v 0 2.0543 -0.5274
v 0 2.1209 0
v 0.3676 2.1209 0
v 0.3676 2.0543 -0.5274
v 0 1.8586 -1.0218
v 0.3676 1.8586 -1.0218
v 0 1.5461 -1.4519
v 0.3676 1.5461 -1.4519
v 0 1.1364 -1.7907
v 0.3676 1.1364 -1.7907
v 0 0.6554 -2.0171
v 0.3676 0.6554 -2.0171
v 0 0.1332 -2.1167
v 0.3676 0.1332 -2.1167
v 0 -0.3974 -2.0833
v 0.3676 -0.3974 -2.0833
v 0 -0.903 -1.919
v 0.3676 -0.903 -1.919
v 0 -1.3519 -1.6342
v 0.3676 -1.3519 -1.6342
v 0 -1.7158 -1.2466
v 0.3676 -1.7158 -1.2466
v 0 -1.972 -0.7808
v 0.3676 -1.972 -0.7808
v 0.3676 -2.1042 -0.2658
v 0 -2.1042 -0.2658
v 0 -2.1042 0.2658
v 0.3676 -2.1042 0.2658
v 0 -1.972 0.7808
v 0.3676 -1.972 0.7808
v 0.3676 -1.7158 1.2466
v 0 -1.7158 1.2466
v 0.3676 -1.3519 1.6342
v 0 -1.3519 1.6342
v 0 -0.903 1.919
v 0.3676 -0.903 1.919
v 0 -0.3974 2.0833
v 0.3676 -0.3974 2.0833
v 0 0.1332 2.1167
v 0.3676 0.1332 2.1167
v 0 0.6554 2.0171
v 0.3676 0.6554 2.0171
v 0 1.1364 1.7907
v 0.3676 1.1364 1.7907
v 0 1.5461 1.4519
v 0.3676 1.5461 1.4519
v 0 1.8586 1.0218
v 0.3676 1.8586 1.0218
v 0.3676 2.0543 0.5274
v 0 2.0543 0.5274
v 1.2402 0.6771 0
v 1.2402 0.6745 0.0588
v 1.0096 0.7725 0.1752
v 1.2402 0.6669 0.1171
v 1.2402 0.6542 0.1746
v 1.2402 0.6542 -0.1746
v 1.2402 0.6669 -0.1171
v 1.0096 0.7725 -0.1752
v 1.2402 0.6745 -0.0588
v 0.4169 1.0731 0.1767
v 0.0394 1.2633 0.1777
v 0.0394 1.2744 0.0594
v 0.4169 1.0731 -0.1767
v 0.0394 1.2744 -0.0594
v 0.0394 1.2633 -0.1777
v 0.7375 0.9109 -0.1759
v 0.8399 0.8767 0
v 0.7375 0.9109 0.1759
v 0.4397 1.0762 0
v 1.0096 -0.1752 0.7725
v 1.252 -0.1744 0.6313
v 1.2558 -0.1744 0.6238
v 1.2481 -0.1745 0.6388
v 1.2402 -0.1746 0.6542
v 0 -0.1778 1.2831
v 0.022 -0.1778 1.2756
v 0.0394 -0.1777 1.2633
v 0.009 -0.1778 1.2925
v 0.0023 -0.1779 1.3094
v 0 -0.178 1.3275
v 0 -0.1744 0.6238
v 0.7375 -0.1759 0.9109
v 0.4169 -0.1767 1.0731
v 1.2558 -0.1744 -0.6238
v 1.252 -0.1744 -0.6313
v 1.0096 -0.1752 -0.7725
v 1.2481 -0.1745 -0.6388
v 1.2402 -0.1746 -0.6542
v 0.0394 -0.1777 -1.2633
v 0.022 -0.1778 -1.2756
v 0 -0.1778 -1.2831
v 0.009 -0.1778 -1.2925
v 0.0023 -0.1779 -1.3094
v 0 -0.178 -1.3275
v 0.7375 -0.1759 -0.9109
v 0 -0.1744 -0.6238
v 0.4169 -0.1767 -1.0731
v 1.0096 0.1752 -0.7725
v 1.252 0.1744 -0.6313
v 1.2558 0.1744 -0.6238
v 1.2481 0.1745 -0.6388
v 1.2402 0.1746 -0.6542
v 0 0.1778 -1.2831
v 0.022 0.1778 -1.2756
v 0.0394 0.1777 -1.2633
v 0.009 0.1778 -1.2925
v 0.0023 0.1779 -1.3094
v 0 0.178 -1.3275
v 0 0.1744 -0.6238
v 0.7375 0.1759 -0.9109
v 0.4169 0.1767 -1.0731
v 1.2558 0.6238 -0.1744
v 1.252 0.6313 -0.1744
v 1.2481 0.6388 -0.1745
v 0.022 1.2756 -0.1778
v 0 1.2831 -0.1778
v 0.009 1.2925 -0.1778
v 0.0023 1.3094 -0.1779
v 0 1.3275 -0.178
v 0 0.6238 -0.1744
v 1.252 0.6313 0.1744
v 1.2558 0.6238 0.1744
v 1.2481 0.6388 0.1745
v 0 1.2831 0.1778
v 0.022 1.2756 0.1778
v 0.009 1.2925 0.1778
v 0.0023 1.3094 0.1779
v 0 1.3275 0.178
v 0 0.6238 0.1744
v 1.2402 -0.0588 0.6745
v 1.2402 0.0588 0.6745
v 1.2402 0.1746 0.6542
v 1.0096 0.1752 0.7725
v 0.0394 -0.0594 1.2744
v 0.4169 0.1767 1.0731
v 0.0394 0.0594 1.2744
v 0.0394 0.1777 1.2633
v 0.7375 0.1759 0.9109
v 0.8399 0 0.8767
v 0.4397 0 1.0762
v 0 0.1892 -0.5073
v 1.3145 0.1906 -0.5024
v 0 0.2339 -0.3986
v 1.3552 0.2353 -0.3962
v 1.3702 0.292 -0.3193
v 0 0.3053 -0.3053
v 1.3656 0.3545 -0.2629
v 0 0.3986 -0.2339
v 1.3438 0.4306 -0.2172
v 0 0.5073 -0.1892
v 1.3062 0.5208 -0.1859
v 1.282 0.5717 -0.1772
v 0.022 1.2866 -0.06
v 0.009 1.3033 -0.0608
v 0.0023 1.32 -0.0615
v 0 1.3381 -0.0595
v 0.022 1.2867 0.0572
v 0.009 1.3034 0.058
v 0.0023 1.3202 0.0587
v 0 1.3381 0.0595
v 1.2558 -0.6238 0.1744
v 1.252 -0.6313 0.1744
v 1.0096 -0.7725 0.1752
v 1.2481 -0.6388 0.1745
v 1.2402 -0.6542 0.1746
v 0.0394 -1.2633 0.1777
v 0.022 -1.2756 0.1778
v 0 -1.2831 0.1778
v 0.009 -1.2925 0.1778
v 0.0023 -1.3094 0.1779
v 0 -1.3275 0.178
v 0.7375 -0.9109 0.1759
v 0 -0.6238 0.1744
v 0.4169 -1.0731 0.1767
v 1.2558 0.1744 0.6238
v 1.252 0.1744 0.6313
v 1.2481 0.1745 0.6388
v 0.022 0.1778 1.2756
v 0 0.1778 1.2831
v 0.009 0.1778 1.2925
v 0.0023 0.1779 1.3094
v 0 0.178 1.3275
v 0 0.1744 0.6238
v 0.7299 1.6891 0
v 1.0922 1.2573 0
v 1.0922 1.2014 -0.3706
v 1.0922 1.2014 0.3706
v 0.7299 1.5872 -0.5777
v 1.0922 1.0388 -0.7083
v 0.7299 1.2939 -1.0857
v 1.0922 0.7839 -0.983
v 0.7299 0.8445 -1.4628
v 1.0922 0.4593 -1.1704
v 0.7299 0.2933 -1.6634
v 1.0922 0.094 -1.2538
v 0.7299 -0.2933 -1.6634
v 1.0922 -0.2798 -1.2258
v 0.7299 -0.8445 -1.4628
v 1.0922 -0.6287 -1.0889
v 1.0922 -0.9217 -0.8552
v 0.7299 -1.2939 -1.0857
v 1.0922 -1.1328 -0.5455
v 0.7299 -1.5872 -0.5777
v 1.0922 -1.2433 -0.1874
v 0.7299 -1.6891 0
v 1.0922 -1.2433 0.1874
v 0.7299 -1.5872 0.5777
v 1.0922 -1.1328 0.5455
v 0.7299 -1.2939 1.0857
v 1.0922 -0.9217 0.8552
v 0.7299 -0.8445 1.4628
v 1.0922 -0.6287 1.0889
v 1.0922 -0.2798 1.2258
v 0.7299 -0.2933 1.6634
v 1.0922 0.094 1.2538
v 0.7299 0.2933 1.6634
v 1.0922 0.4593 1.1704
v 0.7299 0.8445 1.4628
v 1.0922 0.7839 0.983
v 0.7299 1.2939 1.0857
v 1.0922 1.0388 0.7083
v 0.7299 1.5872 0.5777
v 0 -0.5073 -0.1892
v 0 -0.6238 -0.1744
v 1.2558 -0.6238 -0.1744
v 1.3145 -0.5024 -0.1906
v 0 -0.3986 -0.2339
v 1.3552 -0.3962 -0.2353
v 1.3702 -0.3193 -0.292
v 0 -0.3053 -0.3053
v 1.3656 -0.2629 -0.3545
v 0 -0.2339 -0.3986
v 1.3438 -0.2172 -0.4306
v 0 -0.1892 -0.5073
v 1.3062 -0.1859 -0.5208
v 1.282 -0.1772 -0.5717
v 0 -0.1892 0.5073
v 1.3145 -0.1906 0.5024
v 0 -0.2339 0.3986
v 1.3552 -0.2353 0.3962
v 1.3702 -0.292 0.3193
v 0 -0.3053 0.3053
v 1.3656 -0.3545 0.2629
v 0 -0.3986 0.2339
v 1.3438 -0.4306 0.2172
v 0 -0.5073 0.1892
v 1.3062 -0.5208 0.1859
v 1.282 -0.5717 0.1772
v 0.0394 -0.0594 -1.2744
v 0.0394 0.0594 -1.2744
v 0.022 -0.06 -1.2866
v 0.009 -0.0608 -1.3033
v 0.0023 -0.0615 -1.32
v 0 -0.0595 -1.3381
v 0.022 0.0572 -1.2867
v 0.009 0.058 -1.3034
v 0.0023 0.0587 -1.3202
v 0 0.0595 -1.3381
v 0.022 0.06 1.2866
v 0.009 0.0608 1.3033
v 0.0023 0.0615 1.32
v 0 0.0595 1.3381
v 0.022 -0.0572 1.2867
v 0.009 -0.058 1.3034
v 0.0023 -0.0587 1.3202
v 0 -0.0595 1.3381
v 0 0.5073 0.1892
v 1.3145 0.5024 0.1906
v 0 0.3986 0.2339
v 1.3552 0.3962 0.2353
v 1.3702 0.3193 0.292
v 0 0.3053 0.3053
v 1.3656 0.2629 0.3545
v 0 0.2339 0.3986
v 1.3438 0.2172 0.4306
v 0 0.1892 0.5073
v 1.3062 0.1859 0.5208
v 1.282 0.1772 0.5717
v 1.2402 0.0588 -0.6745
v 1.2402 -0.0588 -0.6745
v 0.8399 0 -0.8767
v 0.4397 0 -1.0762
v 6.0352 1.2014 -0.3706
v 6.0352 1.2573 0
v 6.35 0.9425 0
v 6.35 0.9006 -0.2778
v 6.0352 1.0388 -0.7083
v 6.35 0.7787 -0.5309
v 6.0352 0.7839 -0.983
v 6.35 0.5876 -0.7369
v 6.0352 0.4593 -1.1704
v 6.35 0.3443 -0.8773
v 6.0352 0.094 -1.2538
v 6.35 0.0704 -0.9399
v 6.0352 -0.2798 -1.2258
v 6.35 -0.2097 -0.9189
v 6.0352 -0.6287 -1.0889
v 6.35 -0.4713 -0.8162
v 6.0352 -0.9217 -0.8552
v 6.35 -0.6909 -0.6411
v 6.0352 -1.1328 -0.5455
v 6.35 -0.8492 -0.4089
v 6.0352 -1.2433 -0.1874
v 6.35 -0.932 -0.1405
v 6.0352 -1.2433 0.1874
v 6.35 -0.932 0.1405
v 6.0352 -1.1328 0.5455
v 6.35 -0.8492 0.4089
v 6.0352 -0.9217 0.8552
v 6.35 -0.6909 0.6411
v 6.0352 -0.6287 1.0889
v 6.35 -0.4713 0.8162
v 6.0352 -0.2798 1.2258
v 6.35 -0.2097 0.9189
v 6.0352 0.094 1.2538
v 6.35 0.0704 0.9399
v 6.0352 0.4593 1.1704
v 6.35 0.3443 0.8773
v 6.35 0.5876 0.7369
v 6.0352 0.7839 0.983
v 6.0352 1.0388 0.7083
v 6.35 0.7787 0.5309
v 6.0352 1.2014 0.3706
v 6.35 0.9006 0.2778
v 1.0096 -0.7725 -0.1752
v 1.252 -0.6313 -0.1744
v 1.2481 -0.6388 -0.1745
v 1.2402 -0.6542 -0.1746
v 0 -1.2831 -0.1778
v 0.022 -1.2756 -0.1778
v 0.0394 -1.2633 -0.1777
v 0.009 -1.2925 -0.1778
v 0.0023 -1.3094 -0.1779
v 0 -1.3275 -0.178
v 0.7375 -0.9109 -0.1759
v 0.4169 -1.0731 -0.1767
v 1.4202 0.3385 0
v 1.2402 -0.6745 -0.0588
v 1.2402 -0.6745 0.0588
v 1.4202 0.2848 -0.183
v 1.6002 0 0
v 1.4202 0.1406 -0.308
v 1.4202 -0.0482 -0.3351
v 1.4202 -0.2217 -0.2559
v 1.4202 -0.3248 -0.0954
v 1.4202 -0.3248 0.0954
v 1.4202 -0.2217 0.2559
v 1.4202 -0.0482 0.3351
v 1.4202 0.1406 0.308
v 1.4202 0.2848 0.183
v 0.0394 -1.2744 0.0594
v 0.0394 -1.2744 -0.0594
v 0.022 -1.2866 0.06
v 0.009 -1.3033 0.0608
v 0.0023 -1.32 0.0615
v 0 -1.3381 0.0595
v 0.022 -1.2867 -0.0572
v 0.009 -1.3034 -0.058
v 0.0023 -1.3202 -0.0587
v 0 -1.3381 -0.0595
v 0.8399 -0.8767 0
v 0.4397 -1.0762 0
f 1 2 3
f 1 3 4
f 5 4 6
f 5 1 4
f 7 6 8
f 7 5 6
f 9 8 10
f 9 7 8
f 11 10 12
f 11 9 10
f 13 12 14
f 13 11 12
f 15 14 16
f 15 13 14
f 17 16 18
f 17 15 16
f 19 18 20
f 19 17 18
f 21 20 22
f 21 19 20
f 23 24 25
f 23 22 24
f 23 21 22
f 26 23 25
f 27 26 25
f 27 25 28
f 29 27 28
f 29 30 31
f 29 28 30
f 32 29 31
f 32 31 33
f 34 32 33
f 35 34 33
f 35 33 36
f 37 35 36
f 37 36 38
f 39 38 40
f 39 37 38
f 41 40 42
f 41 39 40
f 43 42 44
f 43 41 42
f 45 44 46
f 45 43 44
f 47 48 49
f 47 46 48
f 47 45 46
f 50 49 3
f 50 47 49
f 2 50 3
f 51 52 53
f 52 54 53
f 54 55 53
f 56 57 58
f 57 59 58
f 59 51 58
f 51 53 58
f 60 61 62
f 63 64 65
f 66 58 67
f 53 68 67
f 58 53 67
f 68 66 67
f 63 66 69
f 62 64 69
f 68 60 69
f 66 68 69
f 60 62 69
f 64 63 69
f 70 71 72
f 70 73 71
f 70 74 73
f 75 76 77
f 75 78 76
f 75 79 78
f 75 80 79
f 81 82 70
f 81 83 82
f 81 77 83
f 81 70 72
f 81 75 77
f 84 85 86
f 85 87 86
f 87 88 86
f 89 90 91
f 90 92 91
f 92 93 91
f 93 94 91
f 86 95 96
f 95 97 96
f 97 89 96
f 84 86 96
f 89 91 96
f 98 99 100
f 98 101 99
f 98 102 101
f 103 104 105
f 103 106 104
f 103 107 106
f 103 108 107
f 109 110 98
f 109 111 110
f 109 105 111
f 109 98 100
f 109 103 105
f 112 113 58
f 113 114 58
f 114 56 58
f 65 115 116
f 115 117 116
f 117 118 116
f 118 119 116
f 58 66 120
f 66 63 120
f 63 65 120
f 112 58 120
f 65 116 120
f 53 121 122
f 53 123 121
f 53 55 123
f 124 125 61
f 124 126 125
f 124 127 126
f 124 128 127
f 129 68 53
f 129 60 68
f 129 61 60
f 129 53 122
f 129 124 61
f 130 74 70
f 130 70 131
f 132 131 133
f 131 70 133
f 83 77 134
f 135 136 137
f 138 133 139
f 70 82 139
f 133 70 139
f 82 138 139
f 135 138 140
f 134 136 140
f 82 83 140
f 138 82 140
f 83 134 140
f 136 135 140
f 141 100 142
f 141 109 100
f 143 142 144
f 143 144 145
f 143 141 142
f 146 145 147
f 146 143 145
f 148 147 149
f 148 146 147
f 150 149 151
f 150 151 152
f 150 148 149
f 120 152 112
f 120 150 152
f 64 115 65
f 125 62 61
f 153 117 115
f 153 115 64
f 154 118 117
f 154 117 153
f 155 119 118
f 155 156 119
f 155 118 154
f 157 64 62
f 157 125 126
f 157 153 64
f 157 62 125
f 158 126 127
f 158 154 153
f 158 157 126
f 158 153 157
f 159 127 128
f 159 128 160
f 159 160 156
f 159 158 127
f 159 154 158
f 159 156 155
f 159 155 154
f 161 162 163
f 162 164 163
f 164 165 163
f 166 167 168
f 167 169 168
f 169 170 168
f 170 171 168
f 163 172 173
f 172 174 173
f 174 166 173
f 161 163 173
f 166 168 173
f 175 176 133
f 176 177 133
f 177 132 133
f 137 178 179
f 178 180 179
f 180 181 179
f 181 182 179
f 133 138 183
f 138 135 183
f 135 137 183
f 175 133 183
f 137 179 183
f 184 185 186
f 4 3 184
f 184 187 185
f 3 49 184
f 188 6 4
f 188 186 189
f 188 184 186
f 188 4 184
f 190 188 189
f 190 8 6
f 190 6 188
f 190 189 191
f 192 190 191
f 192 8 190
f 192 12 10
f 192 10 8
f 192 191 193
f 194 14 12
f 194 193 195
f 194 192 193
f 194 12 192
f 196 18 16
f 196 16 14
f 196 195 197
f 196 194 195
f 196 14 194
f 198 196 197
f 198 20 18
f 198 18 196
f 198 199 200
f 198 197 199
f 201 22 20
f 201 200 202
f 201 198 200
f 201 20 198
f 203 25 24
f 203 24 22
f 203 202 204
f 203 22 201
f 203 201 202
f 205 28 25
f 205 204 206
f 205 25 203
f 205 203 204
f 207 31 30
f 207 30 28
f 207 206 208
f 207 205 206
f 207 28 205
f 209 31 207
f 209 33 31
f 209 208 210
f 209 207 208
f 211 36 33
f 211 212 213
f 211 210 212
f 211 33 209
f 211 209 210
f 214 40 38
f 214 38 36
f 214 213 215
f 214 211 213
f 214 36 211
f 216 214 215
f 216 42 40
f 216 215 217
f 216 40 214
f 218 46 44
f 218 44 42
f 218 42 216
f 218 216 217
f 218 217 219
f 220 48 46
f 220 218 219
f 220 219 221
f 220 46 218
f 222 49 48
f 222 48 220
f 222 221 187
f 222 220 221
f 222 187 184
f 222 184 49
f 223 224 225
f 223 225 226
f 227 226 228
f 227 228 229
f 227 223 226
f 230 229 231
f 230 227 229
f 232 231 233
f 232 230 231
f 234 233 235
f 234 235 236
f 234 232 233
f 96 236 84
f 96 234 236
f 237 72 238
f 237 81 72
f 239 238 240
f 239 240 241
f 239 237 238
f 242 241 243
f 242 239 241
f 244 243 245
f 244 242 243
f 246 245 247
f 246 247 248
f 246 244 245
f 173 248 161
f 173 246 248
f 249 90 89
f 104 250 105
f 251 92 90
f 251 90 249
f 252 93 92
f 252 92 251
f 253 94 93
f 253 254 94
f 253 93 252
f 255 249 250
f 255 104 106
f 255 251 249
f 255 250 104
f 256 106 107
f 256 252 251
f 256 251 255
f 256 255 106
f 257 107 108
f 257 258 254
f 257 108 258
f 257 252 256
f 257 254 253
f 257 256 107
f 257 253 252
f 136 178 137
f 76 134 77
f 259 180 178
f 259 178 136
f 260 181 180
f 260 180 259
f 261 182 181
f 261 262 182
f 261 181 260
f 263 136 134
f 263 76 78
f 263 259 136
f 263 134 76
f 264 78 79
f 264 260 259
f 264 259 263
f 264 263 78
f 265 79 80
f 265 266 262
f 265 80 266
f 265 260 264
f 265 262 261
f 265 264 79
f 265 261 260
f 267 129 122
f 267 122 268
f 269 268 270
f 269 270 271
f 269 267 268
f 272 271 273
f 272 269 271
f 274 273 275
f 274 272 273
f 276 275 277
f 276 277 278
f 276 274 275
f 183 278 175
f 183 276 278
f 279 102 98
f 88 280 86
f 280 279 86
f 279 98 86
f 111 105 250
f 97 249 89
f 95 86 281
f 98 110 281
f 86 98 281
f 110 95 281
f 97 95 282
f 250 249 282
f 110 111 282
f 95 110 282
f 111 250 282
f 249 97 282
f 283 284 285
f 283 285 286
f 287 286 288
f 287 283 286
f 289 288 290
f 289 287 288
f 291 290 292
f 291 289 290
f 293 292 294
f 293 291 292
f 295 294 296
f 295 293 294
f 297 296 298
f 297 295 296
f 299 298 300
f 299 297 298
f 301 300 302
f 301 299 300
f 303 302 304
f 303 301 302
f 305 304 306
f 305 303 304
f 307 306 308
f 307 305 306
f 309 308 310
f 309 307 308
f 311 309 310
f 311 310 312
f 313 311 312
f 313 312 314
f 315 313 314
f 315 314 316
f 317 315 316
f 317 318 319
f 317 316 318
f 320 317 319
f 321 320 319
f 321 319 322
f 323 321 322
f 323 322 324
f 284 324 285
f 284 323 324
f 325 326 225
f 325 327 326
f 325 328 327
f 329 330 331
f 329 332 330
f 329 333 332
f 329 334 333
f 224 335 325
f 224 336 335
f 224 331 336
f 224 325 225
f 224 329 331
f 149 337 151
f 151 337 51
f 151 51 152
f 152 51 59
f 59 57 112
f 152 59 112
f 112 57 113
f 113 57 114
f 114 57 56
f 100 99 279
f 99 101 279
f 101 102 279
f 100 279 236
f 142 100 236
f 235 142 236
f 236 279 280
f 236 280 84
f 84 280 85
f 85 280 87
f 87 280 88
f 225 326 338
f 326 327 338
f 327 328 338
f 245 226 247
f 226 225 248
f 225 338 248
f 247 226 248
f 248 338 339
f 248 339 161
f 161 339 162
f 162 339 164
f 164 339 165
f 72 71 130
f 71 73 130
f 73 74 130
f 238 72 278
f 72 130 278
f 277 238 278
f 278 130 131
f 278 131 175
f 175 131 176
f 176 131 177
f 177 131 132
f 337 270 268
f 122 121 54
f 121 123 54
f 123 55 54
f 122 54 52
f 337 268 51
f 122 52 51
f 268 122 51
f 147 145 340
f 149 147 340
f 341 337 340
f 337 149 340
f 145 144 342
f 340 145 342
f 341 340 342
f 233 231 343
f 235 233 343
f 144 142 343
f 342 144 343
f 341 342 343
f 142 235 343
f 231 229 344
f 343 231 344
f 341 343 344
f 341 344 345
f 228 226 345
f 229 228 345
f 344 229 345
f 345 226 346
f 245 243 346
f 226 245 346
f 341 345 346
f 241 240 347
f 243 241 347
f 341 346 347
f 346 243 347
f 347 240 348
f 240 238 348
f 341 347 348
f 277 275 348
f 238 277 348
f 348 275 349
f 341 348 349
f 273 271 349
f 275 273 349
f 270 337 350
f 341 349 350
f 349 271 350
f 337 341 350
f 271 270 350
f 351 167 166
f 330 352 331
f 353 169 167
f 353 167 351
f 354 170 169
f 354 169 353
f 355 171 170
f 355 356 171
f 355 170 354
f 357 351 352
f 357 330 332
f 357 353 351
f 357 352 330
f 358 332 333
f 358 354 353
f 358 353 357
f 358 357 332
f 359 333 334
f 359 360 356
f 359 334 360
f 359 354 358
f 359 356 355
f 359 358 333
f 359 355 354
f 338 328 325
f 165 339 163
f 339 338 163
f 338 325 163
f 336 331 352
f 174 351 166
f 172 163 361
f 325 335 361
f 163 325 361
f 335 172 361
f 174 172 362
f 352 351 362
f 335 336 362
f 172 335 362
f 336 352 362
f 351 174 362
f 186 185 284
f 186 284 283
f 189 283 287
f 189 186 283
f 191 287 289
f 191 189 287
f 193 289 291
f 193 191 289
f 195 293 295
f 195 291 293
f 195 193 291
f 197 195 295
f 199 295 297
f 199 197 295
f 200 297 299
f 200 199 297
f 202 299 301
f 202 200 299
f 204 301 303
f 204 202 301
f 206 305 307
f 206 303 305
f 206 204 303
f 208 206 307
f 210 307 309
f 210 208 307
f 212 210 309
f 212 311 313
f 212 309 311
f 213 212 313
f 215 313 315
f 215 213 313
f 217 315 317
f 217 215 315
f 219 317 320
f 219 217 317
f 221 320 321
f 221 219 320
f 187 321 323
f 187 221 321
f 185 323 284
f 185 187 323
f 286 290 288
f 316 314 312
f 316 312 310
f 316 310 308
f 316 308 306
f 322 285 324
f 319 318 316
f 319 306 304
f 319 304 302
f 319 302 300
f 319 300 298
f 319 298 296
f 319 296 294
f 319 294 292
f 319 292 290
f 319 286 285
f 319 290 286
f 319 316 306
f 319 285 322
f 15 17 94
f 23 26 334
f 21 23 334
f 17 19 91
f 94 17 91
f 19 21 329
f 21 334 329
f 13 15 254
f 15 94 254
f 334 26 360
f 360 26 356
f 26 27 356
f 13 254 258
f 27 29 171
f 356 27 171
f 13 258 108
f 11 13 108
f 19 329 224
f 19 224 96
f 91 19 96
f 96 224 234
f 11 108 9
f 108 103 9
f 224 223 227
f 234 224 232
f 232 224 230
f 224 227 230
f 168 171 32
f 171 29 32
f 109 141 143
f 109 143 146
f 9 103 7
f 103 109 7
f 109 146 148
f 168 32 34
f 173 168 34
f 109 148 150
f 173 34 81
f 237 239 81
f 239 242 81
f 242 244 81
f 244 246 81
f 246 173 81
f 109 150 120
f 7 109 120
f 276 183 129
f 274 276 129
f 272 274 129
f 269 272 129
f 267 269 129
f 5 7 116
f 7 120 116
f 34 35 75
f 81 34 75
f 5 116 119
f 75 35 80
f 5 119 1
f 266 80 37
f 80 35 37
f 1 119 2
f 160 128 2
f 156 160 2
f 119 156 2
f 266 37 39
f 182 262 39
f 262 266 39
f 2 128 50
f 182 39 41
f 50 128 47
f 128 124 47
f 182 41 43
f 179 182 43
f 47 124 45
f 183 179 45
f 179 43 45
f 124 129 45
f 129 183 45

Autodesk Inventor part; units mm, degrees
ref_plane "YZ Plane" through (0, 0, 0) normal (1, 0, 0) x (0, 1, 0)
ref_plane "XZ Plane" through (0, 0, 0) normal (0, 1, 0) x (-1, 0, 0)
sketch "Sketch1" plane through (0, 0, 0) normal (0, 0, 1) x (1, 0, 0)
  line L0 (1.6002, 0) -> (6.35, 0)
  line L1 (6.35, 0) -> (6.35, 1.2573)
  line L2 (6.35, 1.2573) -> (1.0922, 1.2573)
  line L3 (0.3676, 2.1209) -> (0, 2.1209)
  line L4 (-1.27, 0) -> (7.62, 0) projected
  line L5 (0, -0.4242) -> (0, 2.5451) projected
  line L6 (0, 1.2954) -> (1.2402, 0.6771)
  line L7 (1.2402, 0.6771) -> (1.6002, 0)
  line L8 (1.0922, 1.2573) -> (0.3676, 2.1209)
  line L9 (0, 2.1209) -> (0, 1.2954)
  dimension "d2" = 2.5146
  dimension "d3" = 4.2418
  dimension "d4" = 1.6002
  dimension "d5" = 2.5908
  dimension "d6" = 26.5
  dimension "d7" = 62
  dimension "d13" = 50
  dimension "d14" = 1.0922
  dimension "d15" = 6.35
revolve "Body" add sketch "Sketch1" angle 360 about axis through (1.6002, 0, 0) along (1, 0, 0) contours L7 L6 L5 L3 L8 L2 L1 L0
sketch "Sketch2" plane through (0, 0, 0) normal (-1, 0, 0) x (0, 0, 1)
  line L0 (0, -2.9693) -> (0, 2.9693) projected
  line L1 (-2.9693, 0) -> (2.9693, 0) projected
  line L2 (0, 1.2954) -> (0, 0) construction
  line L3 (0, 0) -> (1.2954, 0) construction
  arc A0 (0.4318, 0) -> (0, 0.4318) centre (0, 0) ccw
  line L4 (0, 0) -> (0.7947, 0.7947) construction
  arc A1 (0.6477, 0) -> (0, 0.6477) centre (0, 0) ccw construction
  line L5 (0.1778, 1.2831) -> (0.1744, 0.6238)
  line L6 (1.2831, 0.1778) -> (0.6238, 0.1744)
  arc A2 (0.1744, 0.6238) -> (0.6238, 0.1744) centre (0.6215, 0.6215) ccw
  arc A3 (1.2954, 0) -> (1.2831, 0.1778) centre (0, 0) ccw
  arc A4 (0.1778, 1.2831) -> (0, 1.2954) centre (0, 0) ccw
  arc A5 (1.2831, 0.1778) -> (0.1778, 1.2831) centre (0, 0) ccw
  line L7 (0.1778, -1.2831) -> (0.1744, -0.6238)
  line L8 (1.2831, -0.1778) -> (0.6238, -0.1744)
  arc A6 (0.6238, -0.1744) -> (0.1744, -0.6238) centre (0.6215, -0.6215) ccw
  arc A7 (1.2831, -0.1778) -> (1.2954, 0) centre (0, 0) ccw
  arc A8 (0, -1.2954) -> (0.1778, -1.2831) centre (0, 0) ccw
  arc A9 (0.1778, -1.2831) -> (1.2831, -0.1778) centre (0, 0) ccw
  line L9 (-0.1778, 1.2831) -> (-0.1744, 0.6238)
  line L10 (-1.2831, 0.1778) -> (-0.6238, 0.1744)
  arc A10 (-0.6238, 0.1744) -> (-0.1744, 0.6238) centre (-0.6215, 0.6215) ccw
  arc A11 (-1.2831, 0.1778) -> (-1.2954, 0) centre (0, 0) ccw
  arc A12 (0, 1.2954) -> (-0.1778, 1.2831) centre (0, 0) ccw
  arc A13 (-0.1778, 1.2831) -> (-1.2831, 0.1778) centre (0, 0) ccw
  arc A14 (-1.2831, -0.1778) -> (-0.1778, -1.2831) centre (0, 0) ccw
  arc A15 (-0.1778, -1.2831) -> (0, -1.2954) centre (0, 0) ccw
  arc A16 (-1.2954, 0) -> (-1.2831, -0.1778) centre (0, 0) ccw
  line L11 (-1.2831, -0.1778) -> (-0.6238, -0.1744)
  arc A17 (-0.1744, -0.6238) -> (-0.6238, -0.1744) centre (-0.6215, -0.6215) ccw
  line L12 (-0.1778, -1.2831) -> (-0.1744, -0.6238)
  dimension "d18" = 45
  dimension "d19" = 0.8636
  dimension "d20" = 1.2954
  dimension "d21" = 2.5908
  dimension "d22" = 0.1778
extrude "Slot" add sketch "Sketch2" against normal up to next contours A2 L5 A5 L6 | L9 A10 L10 A13 | L7 A6 L8 A9 | A14 L11 A17 L12
fillet "Fillet1" radius 0.0711 4 edges at (0, 1.2954, 0) (0, 0, 1.2954) (0, -1.2954, 0) (0, 0, -1.2954)
thread "Thread" size "3-48 UNC" class "2A" standard "ANSI Unified Screw Threads" length 3.9349
chamfer "Chamfer1" distance 0.3148 distance2 0.3148 1 edges at (6.35, -1.2573, 0) measured on face at (6.35, -0.6343, -0.3329)
ref_plane "Work Plane2" through (2.032, 0, 0) normal (0, 1, 0) x (1, 0, 0)
equation "\"d2\" = GD"
equation "\"d3\" = KOD"
equation "\"d4\" = INTI"
equation "\"d5\" = SDM"
equation "\"d13\" = 0.5 * SEWI"
equation "\"d14\" = KOH"
equation "\"d15\" = NLG"
equation "\"d19\" = 0.333333 * SDM"
equation "\"d20\" = 0.5 * SDM"
equation "\"d21\" = SDM"
equation "\"d22\" = 0.5 * SBR"
equation "\"d45\" = INTI"
equation "\"d25\" = 0.2 * SBR"
equation "\"d9\" = GEL"
equation "\"d11\" = -0.5 * SPD + 0.5 * GD"
equation "\"d12\" = GUL"
equation "\"GD\" = NND"
equation "\"NLG\" = 6.35"
equation "\"GEL\" = 3.9349"
equation "\"KOD\" = 4.2418"
equation "\"KOH\" = 1.0922"
equation "\"SDM\" = 2.5908"
equation "\"INTI\" = 1.6002"
equation "\"SBR\" = 0.3556"
equation "\"GUL\" = -0.5 * SPD + 0.5 * NND"
equation "\"SPD\" = 1.8849"
equation "\"SEWI\" = 100deg"
equation "\"d0\" = NLG"
equation "\"d1\" = KOH"
equation "\"d17\" = SDM"
equation "\"TOA\" = 30deg"
equation "\"EPV\" = 2.1472"
equation "\"THREADDIA\" = 2.5146"
equation "\"BDM\" = NND"
equation "\"NND\" = 2.5146"
equation "\"GAL\" = 0.52916"
equation "\"GD1\" = SPD"
properties part number "ANSI B18.6.3 - 3-48 UNC x 0,25" material "Steel, Mild"
